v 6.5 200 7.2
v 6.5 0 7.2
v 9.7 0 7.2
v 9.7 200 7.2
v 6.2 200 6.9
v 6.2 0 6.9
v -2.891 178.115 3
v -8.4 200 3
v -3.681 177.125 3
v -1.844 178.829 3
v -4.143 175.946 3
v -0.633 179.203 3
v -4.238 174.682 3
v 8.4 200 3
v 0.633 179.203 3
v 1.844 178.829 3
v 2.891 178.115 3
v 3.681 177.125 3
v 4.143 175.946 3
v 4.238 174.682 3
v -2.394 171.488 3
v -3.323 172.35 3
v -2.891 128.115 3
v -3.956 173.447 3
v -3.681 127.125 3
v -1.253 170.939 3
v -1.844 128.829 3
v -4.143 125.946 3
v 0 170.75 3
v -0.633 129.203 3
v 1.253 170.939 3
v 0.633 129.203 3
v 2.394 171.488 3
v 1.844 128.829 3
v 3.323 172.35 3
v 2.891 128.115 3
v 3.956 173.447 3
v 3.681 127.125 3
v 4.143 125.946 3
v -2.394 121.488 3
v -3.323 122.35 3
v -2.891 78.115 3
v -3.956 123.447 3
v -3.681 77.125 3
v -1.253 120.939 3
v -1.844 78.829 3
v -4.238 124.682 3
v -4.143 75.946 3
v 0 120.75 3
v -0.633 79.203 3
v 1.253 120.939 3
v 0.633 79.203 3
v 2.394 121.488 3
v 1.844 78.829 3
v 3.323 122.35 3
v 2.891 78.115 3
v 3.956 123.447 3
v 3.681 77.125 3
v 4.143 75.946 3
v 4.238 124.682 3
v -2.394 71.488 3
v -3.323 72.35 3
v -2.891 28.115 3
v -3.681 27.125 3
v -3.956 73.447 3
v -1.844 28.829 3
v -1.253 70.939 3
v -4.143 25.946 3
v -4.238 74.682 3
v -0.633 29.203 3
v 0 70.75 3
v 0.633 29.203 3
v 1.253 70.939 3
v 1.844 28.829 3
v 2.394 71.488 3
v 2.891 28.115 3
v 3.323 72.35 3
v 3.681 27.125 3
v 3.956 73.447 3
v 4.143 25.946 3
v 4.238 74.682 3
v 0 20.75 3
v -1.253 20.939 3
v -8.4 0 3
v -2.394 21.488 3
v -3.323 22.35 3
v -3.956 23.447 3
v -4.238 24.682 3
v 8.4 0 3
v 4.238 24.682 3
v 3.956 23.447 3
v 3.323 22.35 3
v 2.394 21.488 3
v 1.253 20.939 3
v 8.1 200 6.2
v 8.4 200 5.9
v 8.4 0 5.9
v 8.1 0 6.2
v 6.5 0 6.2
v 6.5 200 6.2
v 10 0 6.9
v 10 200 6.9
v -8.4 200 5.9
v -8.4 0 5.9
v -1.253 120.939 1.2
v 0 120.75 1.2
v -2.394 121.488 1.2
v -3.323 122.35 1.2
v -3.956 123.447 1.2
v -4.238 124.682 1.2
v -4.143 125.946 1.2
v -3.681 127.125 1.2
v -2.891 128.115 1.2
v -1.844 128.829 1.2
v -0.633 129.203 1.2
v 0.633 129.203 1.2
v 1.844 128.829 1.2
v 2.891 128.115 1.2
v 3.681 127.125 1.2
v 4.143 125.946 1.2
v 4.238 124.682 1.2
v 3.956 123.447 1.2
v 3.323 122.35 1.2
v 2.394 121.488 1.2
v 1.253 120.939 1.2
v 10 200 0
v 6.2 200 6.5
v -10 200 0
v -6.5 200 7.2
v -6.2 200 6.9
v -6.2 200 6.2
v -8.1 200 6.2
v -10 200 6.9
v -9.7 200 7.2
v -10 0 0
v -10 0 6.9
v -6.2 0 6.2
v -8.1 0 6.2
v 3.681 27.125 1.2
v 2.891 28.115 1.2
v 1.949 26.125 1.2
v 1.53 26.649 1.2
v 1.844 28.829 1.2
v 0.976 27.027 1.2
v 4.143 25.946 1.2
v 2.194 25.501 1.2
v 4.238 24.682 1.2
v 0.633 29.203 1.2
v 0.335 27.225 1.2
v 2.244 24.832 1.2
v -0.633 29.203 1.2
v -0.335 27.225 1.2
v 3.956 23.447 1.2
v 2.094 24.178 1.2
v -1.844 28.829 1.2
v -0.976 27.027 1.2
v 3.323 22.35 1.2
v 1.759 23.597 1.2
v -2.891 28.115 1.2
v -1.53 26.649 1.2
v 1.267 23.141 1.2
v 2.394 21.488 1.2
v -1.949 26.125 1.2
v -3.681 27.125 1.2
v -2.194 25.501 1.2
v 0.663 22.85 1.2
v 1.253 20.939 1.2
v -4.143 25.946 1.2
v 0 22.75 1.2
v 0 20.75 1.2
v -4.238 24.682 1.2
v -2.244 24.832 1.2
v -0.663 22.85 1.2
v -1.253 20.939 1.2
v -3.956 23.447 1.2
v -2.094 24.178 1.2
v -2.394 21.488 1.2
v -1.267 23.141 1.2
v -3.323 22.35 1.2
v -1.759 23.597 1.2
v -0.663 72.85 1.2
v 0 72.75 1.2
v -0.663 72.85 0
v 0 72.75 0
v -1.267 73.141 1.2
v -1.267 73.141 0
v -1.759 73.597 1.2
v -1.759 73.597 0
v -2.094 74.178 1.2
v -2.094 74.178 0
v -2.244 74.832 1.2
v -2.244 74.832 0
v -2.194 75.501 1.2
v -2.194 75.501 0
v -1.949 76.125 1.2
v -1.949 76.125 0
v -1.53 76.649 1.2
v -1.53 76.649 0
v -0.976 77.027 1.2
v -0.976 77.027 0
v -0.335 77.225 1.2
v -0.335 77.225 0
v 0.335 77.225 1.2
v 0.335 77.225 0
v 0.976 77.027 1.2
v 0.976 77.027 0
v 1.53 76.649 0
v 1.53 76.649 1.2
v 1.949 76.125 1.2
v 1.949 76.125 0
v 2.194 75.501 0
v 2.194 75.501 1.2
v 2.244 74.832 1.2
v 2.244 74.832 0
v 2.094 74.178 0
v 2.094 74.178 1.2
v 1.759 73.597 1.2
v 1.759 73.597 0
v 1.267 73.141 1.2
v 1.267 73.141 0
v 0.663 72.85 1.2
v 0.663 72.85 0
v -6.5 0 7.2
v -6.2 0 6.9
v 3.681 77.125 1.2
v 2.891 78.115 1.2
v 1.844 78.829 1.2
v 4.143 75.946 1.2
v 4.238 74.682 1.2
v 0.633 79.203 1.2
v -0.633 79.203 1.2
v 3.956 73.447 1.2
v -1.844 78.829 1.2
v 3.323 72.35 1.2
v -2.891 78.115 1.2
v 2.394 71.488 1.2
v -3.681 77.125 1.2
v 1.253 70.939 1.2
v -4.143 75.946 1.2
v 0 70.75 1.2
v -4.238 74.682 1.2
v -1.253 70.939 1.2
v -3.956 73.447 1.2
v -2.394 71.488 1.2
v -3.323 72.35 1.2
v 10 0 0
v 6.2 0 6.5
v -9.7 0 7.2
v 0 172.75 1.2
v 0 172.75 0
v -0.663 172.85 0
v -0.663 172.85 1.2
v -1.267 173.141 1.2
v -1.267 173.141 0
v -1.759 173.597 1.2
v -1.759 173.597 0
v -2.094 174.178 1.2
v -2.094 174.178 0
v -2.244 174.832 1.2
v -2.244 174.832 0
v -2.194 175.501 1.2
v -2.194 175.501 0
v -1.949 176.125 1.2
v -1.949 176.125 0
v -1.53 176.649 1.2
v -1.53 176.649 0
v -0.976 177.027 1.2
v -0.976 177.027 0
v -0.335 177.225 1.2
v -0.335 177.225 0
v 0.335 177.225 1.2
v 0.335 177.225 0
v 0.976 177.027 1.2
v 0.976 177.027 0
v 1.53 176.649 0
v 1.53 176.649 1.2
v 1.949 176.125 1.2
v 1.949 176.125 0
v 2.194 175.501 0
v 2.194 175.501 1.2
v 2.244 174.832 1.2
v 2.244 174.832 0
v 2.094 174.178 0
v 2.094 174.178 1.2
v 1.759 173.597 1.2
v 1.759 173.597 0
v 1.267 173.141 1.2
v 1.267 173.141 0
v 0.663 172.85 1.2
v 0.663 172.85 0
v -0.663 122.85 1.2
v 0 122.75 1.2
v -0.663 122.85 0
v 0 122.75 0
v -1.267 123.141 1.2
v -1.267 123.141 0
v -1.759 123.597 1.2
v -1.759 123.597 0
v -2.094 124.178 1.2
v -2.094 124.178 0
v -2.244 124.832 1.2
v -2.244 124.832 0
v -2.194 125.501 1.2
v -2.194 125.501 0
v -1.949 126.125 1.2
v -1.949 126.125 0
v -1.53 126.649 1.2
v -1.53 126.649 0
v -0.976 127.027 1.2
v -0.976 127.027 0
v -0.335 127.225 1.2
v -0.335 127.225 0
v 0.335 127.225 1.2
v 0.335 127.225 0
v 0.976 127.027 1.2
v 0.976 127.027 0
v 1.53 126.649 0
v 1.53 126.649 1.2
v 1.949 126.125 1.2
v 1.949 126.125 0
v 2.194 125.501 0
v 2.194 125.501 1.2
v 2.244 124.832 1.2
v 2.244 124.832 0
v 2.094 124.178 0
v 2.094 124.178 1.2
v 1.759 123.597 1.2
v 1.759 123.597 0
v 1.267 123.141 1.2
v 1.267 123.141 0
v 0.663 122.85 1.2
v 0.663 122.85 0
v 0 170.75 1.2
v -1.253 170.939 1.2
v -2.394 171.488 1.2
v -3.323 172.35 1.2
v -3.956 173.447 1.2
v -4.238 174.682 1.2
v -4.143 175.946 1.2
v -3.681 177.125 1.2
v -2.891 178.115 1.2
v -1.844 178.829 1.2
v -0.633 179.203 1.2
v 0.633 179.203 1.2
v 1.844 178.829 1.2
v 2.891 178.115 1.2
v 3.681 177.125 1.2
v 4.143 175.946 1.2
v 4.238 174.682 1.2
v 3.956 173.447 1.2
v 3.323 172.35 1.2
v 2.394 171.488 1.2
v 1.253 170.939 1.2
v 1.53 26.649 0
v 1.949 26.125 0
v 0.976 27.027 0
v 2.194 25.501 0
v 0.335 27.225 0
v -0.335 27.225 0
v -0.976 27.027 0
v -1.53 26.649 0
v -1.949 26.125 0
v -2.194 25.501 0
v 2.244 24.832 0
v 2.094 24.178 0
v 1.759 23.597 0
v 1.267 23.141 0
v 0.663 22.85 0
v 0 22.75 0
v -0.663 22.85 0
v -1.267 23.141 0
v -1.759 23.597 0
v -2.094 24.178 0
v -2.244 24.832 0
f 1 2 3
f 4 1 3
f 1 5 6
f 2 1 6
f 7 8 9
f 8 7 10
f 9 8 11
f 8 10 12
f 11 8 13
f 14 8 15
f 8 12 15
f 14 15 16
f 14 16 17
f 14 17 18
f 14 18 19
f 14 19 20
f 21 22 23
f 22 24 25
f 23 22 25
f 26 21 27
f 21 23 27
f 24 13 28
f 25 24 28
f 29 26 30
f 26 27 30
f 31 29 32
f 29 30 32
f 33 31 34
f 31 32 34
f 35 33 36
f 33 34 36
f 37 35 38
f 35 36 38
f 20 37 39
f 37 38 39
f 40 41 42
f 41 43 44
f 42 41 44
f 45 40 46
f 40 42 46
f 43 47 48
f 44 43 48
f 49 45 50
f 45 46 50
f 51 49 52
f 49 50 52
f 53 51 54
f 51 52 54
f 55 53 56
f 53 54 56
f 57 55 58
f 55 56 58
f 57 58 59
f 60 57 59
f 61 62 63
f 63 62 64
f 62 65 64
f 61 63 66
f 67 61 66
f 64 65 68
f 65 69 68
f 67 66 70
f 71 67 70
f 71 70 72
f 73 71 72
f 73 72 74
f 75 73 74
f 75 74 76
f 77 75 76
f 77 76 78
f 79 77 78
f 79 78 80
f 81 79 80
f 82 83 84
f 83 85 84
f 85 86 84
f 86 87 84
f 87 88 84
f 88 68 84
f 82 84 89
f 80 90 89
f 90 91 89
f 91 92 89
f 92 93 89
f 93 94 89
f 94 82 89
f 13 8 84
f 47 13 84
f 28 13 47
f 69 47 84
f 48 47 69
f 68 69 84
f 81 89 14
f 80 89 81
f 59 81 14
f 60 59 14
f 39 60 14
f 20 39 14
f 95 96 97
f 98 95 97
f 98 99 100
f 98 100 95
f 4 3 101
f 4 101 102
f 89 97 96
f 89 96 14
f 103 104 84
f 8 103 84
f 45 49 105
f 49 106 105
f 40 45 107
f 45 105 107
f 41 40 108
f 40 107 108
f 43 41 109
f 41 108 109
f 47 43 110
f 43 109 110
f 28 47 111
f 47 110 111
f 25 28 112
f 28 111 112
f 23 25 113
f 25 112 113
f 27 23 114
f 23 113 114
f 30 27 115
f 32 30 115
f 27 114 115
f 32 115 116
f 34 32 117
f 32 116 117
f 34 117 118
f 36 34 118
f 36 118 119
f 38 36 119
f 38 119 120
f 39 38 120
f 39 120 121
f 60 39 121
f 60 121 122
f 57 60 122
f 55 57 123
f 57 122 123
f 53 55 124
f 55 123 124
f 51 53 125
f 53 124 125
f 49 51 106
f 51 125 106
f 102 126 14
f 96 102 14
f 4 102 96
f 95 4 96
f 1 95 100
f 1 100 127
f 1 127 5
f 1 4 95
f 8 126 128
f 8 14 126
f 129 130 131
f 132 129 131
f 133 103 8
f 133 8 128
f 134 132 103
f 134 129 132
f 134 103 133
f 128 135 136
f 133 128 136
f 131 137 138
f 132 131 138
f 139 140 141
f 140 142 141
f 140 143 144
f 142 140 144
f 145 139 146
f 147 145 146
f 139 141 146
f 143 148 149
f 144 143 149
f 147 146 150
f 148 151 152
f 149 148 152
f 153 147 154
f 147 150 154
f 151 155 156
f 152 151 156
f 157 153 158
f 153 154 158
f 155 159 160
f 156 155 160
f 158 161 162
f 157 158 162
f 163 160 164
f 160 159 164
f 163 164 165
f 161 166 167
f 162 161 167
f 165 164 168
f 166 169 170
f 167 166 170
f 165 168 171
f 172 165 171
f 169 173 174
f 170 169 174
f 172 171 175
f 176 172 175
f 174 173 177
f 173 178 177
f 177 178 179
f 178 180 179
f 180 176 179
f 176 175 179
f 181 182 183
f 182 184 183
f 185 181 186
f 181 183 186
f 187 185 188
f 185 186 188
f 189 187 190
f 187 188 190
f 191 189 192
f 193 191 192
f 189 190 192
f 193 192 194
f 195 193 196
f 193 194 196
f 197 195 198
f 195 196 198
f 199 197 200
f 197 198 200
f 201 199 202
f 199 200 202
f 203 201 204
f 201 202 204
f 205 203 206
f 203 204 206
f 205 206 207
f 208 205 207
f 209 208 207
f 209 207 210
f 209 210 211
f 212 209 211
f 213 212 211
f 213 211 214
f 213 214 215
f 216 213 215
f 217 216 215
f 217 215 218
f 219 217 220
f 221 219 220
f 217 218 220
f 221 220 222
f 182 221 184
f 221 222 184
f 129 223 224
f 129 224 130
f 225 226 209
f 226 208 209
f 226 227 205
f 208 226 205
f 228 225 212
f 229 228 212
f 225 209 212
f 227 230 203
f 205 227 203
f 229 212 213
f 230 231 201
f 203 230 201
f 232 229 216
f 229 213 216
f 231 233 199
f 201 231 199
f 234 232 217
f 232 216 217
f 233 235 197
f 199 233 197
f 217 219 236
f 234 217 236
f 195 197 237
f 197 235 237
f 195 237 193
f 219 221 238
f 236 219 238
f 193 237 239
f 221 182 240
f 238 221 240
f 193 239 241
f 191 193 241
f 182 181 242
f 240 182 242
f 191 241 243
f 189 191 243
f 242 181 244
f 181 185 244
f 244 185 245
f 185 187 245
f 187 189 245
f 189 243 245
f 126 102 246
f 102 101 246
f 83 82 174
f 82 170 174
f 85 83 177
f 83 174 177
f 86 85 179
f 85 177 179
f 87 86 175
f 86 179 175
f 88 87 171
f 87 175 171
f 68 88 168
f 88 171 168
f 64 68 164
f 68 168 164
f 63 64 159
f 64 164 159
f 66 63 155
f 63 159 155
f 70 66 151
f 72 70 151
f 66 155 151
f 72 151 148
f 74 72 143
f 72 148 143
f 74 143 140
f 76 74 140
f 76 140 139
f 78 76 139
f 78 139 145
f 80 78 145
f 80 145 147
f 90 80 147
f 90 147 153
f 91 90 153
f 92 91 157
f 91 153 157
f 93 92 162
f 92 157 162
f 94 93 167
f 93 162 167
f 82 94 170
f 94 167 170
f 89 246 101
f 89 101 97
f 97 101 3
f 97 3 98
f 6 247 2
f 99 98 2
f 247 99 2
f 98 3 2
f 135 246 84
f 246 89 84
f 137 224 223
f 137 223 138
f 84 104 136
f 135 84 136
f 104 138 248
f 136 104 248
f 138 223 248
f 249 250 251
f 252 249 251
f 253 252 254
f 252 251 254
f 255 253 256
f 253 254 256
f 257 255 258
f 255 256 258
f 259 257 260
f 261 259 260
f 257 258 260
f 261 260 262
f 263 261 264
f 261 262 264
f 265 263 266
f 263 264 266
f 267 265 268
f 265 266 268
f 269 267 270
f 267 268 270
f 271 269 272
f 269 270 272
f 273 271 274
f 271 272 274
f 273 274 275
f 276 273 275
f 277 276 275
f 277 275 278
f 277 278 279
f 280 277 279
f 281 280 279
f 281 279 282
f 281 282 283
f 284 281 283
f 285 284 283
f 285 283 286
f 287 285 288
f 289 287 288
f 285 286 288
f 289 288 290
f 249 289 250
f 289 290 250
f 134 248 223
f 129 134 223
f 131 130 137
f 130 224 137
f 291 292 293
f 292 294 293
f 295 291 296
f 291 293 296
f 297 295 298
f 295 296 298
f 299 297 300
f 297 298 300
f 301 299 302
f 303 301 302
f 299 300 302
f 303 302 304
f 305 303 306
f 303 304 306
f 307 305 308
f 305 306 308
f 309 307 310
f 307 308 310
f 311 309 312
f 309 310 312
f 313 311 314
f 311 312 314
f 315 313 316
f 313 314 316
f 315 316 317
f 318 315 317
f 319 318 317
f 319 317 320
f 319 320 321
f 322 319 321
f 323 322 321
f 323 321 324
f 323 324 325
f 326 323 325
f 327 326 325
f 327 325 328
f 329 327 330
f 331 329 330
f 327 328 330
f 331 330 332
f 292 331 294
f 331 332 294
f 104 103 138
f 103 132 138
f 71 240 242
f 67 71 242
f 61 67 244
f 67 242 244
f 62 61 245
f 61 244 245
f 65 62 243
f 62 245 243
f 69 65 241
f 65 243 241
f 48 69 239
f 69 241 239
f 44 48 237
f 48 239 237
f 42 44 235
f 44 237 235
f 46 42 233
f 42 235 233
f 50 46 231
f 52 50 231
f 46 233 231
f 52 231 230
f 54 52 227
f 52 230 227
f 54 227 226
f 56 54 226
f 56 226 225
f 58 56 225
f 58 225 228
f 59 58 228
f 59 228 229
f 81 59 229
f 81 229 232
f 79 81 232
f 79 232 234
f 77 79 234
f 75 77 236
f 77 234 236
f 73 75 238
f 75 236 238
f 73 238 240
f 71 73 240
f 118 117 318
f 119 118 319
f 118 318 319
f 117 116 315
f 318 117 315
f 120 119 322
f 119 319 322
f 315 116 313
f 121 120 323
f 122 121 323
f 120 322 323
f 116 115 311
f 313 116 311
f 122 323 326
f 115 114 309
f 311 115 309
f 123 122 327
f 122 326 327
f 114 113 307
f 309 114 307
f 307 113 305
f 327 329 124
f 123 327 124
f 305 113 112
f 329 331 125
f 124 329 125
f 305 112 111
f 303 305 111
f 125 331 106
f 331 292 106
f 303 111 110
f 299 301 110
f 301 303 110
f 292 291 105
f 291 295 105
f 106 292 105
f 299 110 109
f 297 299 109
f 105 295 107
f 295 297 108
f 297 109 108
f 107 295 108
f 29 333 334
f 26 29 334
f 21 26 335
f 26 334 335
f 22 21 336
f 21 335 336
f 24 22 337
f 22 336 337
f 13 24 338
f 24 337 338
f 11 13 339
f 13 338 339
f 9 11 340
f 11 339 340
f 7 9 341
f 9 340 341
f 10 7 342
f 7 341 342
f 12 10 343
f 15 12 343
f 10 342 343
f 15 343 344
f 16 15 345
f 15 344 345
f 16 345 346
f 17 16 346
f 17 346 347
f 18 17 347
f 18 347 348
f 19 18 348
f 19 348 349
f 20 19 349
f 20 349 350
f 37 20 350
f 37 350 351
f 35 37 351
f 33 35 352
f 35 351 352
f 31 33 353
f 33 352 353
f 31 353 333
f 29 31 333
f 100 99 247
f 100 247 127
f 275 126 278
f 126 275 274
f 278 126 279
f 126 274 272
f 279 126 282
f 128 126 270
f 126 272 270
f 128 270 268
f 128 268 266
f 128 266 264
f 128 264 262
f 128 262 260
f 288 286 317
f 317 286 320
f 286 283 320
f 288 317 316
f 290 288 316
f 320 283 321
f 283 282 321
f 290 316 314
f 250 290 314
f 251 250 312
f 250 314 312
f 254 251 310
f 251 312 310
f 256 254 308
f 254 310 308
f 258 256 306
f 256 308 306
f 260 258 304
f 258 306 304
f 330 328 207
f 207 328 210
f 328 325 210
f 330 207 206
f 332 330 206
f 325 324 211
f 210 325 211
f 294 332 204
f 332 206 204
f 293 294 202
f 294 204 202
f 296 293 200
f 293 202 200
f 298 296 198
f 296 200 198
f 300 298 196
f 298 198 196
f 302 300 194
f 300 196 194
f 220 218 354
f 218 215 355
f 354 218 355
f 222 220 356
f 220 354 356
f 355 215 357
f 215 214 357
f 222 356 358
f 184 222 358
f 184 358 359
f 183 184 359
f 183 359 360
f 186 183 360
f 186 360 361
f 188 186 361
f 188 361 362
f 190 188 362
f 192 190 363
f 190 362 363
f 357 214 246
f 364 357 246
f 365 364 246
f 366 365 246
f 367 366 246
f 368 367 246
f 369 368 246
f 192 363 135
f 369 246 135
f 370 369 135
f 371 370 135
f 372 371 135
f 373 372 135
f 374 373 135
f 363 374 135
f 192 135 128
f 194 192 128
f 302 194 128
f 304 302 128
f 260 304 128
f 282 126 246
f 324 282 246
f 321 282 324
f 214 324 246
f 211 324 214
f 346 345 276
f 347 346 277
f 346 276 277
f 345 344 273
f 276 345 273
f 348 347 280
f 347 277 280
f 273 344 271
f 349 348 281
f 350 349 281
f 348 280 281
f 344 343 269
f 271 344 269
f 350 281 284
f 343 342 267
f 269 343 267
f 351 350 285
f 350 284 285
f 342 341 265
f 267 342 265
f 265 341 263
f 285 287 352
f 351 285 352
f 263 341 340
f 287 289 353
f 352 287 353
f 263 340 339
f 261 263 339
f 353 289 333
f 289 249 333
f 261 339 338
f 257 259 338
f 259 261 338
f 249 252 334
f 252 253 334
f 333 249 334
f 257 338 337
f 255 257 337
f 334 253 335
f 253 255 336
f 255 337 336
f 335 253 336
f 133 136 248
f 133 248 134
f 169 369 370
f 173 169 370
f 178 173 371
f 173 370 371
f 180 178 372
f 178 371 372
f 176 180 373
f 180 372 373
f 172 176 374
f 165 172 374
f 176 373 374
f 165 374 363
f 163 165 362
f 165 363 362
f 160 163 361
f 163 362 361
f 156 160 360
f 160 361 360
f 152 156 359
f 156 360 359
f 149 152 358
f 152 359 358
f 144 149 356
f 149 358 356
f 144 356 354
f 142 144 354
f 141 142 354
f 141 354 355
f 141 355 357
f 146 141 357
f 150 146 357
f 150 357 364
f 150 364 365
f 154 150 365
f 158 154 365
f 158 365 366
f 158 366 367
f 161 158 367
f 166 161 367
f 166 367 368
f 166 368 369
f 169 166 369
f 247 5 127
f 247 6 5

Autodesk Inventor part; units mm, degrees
ref_plane "YZ Plane" through (0, 0, 0) normal (1, 0, 0) x (0, 1, 0)
ref_plane "XZ Plane" through (0, 0, 0) normal (0, 1, 0) x (-1, 0, 0)
ref_plane "XY Plane" through (0, 0, 0) normal (0, 0, 1) x (1, 0, 0)
sketch "スケッチ1" plane through (0, 0, 0) normal (0, 1, 0) x (-1, 0, 0)
  line L0 (-10, 0) -> (10, 0)
  line L1 (10, 0) -> (10, 7.2)
  line L2 (10, 7.2) -> (6.2, 7.2)
  line L3 (8.4, 3) -> (-8.4, 3)
  line L4 (-6.2, 7.2) -> (-10, 7.2)
  line L5 (-10, 7.2) -> (-10, 0)
  line L6 (6.2, 7.2) -> (6.2, 6.2)
  line L7 (6.2, 6.2) -> (8.4, 6.2)
  line L8 (8.4, 6.2) -> (8.4, 3)
  line L9 (-6.2, 7.2) -> (-6.2, 6.2)
  line L10 (-6.2, 6.2) -> (-8.4, 6.2)
  line L11 (-8.4, 6.2) -> (-8.4, 3)
  point P0 (0, 0)
  point P1 (0, 0)
  point P2 (0, 3)
  dimension "d0" = 20
  dimension "d1" = 7.2
  dimension "d2" = 3
  dimension "d3" = 12.4
  dimension "d4" = 1
  dimension "d22" = 16.8
extrude "押し出し1" add sketch "スケッチ1" along normal blind 200
chamfer "面取り1" distance 0.3 angle 45 7 edges at (-10, 100, 7.2) (-6.2, 100, 7.2) (6.2, 100, 6.2) (6.2, 100, 7.2) (10, 100, 7.2) (8.4, 100, 6.2) (-8.4, 100, 6.2)
sketch "スケッチ2" plane through (-8.4, 0, 3) normal (0, 0, 1) x (1, 0, 0)
  line L0 (0, 0) -> (16.8, 0) construction
  point P0 (8.4, 0)
  point P1 (8.4, 25)
  point P2 (8.4, 0)
  dimension "d11" = 25
hole "穴1" at (0, 25, 3) direction (0, 0, -1) diameter 4.5 end through all counterbore diameter 8.5 counterbore depth 1.8
pattern_linear "矩形状パターン1" count 10 spacing 50 along (0, 1, 0) of "穴1"
equation "\"d6\" = Length"
equation "\"Length\" = 200"
properties part number "MRS20-200" material "アルミニウム 6061"
